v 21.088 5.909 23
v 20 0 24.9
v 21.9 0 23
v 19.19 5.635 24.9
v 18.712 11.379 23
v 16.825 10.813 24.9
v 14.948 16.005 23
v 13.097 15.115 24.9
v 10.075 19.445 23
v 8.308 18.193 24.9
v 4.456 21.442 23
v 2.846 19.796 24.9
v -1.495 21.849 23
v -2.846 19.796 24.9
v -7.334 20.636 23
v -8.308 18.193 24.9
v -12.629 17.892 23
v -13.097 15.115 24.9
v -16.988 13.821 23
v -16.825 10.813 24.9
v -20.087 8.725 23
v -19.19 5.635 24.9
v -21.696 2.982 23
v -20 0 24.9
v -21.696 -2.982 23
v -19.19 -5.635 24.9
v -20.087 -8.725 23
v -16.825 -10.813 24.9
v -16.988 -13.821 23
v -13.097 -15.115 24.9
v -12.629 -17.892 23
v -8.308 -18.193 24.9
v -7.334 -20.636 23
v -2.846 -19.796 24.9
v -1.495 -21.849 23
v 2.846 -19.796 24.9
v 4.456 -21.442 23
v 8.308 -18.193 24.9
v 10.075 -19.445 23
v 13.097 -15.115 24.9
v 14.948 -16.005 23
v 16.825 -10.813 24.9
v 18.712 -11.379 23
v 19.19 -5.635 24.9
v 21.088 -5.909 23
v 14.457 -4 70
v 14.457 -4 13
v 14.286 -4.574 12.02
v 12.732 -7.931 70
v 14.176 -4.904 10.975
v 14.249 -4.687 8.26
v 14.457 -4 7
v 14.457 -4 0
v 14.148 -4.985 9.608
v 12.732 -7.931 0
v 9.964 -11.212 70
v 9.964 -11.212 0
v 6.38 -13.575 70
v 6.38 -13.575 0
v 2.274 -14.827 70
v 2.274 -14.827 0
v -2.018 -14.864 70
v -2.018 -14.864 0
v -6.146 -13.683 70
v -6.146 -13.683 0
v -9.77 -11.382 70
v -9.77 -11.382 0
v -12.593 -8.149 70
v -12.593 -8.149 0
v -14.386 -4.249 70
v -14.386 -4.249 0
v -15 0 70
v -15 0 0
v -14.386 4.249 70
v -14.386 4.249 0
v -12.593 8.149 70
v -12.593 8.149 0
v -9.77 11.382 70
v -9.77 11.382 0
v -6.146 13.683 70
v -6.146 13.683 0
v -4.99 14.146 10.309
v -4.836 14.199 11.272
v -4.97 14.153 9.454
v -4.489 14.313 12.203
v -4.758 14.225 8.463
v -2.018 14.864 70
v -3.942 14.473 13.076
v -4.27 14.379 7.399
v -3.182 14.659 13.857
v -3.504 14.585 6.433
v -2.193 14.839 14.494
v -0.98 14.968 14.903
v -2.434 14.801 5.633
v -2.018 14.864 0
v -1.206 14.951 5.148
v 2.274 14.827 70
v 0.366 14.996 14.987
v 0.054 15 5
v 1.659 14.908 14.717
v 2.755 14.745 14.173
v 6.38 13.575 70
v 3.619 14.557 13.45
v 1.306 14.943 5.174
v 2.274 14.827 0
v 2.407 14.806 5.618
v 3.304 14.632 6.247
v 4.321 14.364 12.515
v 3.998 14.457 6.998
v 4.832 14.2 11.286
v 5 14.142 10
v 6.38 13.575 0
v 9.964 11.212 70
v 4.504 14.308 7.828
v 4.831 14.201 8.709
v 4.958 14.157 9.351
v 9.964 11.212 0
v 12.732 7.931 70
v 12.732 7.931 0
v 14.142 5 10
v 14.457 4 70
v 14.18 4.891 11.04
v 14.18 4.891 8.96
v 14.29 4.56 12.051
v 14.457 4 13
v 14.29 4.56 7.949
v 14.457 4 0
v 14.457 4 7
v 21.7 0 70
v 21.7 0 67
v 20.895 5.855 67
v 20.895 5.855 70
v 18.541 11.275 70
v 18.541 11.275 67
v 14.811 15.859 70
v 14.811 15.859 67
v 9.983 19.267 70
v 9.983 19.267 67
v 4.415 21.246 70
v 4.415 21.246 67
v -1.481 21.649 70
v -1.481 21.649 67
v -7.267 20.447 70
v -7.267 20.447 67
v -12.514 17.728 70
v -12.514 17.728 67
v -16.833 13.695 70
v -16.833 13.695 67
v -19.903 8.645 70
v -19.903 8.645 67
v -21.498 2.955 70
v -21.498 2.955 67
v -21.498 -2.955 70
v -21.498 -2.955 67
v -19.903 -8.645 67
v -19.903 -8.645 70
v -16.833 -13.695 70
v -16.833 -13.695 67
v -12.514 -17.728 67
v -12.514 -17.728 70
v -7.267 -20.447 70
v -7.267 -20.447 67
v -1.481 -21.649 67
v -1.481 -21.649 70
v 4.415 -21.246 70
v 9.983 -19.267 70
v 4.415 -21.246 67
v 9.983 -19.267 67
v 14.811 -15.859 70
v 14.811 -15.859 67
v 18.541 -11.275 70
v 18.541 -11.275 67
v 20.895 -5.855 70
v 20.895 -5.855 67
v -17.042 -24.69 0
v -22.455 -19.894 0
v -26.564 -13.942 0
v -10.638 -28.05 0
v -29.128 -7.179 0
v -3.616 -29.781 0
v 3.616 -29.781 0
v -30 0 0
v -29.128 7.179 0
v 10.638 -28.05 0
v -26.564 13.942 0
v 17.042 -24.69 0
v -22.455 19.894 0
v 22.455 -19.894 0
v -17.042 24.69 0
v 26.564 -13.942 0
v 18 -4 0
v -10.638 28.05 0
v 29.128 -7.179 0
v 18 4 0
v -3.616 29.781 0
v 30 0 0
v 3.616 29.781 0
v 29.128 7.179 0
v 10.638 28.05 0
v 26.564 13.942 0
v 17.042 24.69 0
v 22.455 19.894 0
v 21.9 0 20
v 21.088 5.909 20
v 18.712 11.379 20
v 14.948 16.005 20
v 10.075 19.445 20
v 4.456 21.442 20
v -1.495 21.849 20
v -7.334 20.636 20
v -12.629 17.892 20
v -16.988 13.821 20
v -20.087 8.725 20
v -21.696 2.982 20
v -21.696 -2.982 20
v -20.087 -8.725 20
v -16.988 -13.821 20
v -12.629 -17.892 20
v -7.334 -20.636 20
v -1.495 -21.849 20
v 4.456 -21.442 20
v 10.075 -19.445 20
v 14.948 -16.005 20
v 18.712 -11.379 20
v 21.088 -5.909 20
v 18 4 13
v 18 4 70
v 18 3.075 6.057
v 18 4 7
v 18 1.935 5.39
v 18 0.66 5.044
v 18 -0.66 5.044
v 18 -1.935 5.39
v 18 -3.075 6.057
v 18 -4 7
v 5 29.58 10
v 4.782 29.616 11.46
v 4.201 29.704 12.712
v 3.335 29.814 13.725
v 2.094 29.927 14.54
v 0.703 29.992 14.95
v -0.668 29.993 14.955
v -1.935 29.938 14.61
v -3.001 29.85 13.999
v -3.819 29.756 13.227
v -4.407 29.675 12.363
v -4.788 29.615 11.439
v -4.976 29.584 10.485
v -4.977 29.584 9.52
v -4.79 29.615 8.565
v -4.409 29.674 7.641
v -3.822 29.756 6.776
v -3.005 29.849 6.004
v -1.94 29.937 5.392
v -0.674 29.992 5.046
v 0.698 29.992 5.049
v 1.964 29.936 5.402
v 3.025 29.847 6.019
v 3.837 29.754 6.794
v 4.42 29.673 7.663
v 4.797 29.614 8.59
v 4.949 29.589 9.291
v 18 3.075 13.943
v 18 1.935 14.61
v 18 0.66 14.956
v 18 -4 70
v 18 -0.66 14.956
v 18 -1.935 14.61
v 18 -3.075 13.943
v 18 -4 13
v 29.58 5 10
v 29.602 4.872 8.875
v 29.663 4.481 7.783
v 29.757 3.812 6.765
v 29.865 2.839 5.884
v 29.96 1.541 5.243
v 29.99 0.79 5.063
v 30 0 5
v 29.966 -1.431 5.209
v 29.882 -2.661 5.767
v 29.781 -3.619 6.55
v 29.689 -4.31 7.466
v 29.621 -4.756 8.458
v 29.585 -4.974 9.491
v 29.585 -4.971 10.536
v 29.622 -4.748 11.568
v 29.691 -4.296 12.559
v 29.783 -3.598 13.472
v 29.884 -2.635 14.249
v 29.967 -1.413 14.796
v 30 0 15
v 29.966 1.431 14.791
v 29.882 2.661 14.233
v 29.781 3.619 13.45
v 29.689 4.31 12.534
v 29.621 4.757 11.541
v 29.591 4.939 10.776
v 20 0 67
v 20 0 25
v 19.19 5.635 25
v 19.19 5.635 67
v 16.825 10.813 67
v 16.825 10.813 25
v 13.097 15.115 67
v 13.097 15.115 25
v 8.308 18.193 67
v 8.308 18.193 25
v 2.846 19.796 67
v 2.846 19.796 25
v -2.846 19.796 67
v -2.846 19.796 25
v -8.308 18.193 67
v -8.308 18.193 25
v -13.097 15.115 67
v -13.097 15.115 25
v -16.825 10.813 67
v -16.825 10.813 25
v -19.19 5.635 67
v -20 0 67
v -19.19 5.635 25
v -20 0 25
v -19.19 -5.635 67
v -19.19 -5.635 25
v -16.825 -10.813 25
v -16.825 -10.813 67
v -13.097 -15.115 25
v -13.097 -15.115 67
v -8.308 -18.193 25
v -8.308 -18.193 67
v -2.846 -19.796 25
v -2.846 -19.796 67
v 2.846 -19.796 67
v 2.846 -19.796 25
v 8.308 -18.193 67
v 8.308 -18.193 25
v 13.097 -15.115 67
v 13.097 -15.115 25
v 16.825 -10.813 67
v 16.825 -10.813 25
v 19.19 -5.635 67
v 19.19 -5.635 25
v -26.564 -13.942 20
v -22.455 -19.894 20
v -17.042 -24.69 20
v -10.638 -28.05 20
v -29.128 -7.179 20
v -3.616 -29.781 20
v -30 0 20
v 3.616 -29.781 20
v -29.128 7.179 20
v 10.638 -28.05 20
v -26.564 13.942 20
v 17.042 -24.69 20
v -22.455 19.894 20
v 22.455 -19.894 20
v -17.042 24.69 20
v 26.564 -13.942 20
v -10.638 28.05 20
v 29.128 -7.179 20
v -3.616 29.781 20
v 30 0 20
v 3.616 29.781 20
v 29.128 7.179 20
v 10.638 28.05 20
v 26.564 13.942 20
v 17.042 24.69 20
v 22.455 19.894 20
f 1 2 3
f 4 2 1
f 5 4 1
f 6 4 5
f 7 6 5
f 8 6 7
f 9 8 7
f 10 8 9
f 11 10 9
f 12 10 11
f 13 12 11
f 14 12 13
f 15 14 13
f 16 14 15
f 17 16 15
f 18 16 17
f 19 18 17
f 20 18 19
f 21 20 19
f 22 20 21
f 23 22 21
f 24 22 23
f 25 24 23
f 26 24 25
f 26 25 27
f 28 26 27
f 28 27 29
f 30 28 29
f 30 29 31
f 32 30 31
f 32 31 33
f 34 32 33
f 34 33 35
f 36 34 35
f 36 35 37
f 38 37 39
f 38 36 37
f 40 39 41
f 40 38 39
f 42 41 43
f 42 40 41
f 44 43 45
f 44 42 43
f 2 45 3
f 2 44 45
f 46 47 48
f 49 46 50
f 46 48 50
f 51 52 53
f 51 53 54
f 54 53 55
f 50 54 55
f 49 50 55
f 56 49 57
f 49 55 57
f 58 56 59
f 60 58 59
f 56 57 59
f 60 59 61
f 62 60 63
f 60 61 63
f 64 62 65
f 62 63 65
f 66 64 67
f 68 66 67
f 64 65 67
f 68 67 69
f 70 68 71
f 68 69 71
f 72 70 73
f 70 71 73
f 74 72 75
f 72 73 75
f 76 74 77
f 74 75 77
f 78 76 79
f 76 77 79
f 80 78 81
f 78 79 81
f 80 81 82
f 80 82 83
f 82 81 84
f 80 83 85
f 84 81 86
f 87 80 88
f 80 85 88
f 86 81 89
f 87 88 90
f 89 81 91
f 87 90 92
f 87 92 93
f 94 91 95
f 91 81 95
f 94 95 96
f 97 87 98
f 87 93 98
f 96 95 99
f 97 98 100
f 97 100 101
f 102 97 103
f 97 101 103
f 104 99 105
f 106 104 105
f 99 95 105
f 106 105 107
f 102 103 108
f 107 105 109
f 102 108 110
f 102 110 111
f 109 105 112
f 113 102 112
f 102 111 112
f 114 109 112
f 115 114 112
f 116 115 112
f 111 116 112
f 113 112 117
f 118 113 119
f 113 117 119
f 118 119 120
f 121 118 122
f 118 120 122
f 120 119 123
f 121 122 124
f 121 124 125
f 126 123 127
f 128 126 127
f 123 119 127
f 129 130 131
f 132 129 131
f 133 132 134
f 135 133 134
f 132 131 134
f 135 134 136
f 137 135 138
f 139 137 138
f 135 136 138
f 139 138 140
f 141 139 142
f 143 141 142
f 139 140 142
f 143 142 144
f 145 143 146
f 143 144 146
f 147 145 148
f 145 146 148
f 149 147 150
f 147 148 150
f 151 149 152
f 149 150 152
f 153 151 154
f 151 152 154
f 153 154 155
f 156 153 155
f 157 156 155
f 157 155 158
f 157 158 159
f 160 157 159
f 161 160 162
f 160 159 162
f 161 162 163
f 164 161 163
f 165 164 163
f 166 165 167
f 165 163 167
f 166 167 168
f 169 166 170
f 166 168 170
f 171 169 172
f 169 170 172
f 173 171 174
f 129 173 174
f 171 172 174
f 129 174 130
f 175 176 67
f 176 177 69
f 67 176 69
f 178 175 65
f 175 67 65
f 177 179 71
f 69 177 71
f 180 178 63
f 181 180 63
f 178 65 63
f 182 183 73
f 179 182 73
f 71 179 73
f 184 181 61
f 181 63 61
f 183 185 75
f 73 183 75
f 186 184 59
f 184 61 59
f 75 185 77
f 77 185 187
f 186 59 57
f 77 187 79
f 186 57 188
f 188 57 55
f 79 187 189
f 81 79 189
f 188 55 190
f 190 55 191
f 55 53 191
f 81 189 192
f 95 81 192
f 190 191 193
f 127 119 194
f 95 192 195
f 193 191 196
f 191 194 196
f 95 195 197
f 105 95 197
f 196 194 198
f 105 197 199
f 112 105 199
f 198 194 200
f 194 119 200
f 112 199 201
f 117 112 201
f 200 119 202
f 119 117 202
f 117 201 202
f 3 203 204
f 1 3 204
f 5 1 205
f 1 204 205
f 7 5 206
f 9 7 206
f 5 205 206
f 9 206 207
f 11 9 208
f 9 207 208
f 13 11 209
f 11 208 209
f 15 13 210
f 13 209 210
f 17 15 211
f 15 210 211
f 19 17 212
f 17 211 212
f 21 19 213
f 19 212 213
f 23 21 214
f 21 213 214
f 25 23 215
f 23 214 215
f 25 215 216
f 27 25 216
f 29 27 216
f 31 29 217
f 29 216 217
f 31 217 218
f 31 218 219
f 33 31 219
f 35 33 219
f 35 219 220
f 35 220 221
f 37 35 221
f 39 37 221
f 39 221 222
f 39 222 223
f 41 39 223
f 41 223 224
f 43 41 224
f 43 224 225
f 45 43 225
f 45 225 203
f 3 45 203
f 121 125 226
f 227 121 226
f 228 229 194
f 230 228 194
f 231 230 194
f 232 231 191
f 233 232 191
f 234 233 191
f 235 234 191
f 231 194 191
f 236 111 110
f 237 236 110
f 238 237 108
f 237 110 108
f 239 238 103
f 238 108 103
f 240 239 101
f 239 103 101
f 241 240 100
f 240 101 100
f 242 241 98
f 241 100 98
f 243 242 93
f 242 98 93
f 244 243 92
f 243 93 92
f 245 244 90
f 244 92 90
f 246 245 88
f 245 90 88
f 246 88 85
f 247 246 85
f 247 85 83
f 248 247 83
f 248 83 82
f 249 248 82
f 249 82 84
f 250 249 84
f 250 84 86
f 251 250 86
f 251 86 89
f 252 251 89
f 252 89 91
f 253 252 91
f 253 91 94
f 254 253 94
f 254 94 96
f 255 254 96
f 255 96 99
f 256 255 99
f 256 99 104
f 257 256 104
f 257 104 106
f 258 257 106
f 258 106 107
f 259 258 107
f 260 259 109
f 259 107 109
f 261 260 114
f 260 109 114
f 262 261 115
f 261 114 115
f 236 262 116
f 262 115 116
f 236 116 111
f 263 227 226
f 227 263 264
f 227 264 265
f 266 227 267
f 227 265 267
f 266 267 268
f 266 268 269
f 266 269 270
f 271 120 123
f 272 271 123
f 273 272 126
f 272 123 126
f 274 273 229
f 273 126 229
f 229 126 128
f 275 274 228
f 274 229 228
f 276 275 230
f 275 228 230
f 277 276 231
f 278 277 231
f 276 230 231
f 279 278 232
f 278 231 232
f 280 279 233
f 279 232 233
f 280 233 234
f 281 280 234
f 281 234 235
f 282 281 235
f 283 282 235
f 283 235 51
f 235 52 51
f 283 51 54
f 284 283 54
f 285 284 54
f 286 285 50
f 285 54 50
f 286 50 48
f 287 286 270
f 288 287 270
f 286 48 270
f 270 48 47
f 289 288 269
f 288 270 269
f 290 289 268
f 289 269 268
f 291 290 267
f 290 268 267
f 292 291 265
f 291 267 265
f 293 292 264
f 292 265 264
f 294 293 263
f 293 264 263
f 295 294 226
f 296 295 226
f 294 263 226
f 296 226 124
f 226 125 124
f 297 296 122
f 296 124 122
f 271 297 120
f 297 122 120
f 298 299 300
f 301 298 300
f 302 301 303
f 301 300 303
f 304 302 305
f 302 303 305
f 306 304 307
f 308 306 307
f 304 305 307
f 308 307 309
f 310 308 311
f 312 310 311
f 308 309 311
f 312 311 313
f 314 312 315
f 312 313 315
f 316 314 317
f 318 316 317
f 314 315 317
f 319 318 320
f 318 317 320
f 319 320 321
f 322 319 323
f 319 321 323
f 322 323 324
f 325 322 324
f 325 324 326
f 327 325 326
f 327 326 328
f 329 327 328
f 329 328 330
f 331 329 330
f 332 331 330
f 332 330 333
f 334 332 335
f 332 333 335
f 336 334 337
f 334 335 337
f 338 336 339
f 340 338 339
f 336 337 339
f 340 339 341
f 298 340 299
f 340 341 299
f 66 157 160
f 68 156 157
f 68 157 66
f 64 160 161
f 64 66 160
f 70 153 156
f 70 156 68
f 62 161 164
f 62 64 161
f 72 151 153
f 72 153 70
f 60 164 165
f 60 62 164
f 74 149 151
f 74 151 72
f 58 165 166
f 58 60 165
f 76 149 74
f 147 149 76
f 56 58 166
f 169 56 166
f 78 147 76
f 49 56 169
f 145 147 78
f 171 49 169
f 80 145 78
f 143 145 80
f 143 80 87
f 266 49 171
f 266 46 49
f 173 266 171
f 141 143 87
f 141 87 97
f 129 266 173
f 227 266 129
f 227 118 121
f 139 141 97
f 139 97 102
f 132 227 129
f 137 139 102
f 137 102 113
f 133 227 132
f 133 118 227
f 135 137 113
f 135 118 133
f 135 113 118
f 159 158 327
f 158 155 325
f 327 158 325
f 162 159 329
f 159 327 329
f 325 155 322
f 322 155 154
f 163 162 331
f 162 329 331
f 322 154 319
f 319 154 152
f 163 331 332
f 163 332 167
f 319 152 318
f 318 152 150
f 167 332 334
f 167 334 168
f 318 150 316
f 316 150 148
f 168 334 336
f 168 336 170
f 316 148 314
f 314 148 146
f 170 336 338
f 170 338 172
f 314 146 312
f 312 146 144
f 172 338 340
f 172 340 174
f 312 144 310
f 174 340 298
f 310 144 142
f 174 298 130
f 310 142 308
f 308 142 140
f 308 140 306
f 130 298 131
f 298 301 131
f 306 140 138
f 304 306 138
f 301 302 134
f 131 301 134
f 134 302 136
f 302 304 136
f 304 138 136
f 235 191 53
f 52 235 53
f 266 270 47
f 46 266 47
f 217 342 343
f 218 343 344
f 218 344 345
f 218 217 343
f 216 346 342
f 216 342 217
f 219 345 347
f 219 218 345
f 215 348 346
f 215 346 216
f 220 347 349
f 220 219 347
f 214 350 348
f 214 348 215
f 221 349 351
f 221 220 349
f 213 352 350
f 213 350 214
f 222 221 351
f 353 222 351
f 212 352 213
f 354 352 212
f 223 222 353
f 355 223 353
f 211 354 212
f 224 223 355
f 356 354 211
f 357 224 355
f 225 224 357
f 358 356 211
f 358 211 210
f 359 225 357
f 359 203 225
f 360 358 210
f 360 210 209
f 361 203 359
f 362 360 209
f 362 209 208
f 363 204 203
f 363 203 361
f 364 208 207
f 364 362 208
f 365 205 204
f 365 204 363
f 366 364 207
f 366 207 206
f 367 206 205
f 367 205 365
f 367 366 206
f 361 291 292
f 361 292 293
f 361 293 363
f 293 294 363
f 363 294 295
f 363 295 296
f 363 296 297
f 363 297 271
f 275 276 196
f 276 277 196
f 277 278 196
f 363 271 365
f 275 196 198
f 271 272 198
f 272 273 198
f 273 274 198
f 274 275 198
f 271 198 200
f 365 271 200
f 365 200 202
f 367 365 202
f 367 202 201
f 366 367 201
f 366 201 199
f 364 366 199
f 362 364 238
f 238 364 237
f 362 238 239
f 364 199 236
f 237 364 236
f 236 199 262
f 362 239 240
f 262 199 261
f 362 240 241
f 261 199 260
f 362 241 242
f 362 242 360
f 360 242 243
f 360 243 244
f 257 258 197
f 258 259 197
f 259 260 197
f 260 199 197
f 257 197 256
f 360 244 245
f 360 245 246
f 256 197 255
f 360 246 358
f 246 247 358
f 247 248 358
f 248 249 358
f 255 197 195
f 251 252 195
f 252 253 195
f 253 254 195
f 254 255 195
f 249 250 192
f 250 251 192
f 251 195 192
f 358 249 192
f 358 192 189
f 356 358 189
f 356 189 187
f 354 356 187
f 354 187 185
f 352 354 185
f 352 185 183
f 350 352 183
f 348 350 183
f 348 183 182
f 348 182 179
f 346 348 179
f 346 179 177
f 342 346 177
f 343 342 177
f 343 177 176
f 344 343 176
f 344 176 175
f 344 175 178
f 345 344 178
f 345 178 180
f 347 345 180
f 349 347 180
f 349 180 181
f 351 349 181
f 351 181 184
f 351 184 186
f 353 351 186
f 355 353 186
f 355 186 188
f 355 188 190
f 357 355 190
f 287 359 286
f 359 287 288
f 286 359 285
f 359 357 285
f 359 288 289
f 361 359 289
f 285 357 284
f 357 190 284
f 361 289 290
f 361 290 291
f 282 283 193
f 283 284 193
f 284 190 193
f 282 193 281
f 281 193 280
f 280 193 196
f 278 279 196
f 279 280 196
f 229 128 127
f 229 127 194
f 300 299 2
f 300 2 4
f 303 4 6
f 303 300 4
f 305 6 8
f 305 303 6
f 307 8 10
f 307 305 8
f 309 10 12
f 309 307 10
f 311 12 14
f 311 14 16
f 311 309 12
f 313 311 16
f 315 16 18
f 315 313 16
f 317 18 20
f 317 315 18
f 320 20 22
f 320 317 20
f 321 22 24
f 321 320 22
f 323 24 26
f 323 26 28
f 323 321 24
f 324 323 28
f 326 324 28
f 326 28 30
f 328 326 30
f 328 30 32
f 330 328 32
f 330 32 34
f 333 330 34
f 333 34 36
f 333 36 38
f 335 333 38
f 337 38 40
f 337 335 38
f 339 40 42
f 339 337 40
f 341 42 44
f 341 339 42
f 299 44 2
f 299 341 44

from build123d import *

# Parameters (mm, degrees)
F0_R         = 30
F1_DEPTH     = 20
F2_R         = 21.9
F3_DEPTH     = 5
F4_R         = 20
F5_DEPTH     = 42
F6_R         = 21.7
F6_R_2       = 20
F7_DEPTH     = 3
F9_D         = 10
F9_DEPTH     = 80
F9_TIP       = 3.0043030951
F11_D        = 10
F11_DEPTH    = 50
F11_TIP      = 3.0043030951
F12_S5_R     = 20
F12_T6_DEPTH = 32


# Not quite as in the source:
# - a fillet or chamfer that OpenCascade refuses, or shapes differently, is made with other operations: its cross-section is extruded or revolved along the edge and cut away or added


with BuildPart() as f1:
    # F0 (on Top) → F1 (new body)
    with BuildSketch(Plane.XY):
        Circle(F0_R)
        with BuildLine():
            ThreePointArc((14.4568322948, -4), (-15, 0), (14.4568322948, 4))
            Line((14.4568322948, 4), (18, 4))
            Line((18, 4), (18, 0))
            Line((18, 0), (18, -4))
            Line((18, -4), (14.4568322948, -4))
        make_face(mode=Mode.SUBTRACT)
    extrude(amount=F1_DEPTH)

    # F2 (on face) → F3 (join)
    with BuildSketch(Plane.XY.offset(20)):
        Circle(F2_R)
        with BuildLine():
            ThreePointArc((14.4568322948, -4), (-15, 0), (14.4568322948, 4))
            Line((14.4568322948, 4), (18, 4))
            Line((18, 4), (18, -4))
            Line((18, -4), (14.4568322948, -4))
        make_face(mode=Mode.SUBTRACT)
    extrude(amount=F3_DEPTH)

    # F4 (on face) → F5 (join)
    with BuildSketch(Plane.XY.offset(25)):
        Circle(F4_R)
        with BuildLine():
            ThreePointArc((14.4568322948, -4), (-15, 0), (14.4568322948, 4))
            Line((14.4568322948, 4), (18, 4))
            Line((18, 4), (18, -4))
            Line((18, -4), (14.4568322948, -4))
        make_face(mode=Mode.SUBTRACT)
    extrude(amount=F5_DEPTH)

    # F6 (on face) → F7 (join)
    with BuildSketch(Plane.XY.offset(67)):
        Circle(F6_R)
        Circle(F6_R_2, mode=Mode.SUBTRACT)
        Circle(F6_R_2)
        with BuildLine():
            ThreePointArc((14.4568322948, -4), (-15, 0), (14.4568322948, 4))
            Line((14.4568322948, 4), (18, 4))
            Line((18, 4), (18, -4))
            Line((18, -4), (14.4568322948, -4))
        make_face(mode=Mode.SUBTRACT)
    extrude(amount=F7_DEPTH)

    # F9 (one way)
    with BuildSketch(Plane(origin=(0, 0, 0), x_dir=(0, 1, 0), z_dir=(-1, 0, 0))):
        with Locations((0, -10)):
            Circle(F9_D / 2)
    extrude(amount=-F9_DEPTH, mode=Mode.SUBTRACT)
    with Locations(Plane(origin=(0, 0, 0), x_dir=(0, 1, 0), z_dir=(-1, 0, 0))):
        with Locations((0, -10)):
            with Locations((0, 0, -(F9_DEPTH + F9_TIP / 2))):  # 118° drill point
                Cone(0, F9_D / 2, F9_TIP, mode=Mode.SUBTRACT)

    # F11 (one way)
    with BuildSketch(Plane.XZ):
        with Locations((0, 10)):
            Circle(F11_D / 2)
    extrude(amount=-F11_DEPTH, mode=Mode.SUBTRACT)
    with Locations(Plane.XZ):
        with Locations((0, 10)):
            with Locations((0, 0, -(F11_DEPTH + F11_TIP / 2))):  # 118° drill point
                Cone(0, F11_D / 2, F11_TIP, mode=Mode.SUBTRACT)

    # F12: chamfer of 2 on 1 edges, made by hand


with BuildPart() as f12_tool2:
    # F12_s3 → F12_t4 (revolve)
    with BuildSketch(Plane.XZ):
        Polygon((21.9, 23), (19.9, 25), (21.9, 25), align=None)
    revolve(axis=Axis((0, 0, 25), (0, 0, 1)))

    # F12_s5 → F12_t6 (cut, symmetric)
    with BuildSketch(Plane.XY.offset(24)):
        Circle(F12_S5_R)
    extrude(amount=F12_T6_DEPTH, both=True, mode=Mode.SUBTRACT)


with BuildPart() as f1_1:
    add(f1.part)

    # F12_t1: cut F12_tool2
    add(f12_tool2.part, mode=Mode.SUBTRACT)


solid = f1_1.part
